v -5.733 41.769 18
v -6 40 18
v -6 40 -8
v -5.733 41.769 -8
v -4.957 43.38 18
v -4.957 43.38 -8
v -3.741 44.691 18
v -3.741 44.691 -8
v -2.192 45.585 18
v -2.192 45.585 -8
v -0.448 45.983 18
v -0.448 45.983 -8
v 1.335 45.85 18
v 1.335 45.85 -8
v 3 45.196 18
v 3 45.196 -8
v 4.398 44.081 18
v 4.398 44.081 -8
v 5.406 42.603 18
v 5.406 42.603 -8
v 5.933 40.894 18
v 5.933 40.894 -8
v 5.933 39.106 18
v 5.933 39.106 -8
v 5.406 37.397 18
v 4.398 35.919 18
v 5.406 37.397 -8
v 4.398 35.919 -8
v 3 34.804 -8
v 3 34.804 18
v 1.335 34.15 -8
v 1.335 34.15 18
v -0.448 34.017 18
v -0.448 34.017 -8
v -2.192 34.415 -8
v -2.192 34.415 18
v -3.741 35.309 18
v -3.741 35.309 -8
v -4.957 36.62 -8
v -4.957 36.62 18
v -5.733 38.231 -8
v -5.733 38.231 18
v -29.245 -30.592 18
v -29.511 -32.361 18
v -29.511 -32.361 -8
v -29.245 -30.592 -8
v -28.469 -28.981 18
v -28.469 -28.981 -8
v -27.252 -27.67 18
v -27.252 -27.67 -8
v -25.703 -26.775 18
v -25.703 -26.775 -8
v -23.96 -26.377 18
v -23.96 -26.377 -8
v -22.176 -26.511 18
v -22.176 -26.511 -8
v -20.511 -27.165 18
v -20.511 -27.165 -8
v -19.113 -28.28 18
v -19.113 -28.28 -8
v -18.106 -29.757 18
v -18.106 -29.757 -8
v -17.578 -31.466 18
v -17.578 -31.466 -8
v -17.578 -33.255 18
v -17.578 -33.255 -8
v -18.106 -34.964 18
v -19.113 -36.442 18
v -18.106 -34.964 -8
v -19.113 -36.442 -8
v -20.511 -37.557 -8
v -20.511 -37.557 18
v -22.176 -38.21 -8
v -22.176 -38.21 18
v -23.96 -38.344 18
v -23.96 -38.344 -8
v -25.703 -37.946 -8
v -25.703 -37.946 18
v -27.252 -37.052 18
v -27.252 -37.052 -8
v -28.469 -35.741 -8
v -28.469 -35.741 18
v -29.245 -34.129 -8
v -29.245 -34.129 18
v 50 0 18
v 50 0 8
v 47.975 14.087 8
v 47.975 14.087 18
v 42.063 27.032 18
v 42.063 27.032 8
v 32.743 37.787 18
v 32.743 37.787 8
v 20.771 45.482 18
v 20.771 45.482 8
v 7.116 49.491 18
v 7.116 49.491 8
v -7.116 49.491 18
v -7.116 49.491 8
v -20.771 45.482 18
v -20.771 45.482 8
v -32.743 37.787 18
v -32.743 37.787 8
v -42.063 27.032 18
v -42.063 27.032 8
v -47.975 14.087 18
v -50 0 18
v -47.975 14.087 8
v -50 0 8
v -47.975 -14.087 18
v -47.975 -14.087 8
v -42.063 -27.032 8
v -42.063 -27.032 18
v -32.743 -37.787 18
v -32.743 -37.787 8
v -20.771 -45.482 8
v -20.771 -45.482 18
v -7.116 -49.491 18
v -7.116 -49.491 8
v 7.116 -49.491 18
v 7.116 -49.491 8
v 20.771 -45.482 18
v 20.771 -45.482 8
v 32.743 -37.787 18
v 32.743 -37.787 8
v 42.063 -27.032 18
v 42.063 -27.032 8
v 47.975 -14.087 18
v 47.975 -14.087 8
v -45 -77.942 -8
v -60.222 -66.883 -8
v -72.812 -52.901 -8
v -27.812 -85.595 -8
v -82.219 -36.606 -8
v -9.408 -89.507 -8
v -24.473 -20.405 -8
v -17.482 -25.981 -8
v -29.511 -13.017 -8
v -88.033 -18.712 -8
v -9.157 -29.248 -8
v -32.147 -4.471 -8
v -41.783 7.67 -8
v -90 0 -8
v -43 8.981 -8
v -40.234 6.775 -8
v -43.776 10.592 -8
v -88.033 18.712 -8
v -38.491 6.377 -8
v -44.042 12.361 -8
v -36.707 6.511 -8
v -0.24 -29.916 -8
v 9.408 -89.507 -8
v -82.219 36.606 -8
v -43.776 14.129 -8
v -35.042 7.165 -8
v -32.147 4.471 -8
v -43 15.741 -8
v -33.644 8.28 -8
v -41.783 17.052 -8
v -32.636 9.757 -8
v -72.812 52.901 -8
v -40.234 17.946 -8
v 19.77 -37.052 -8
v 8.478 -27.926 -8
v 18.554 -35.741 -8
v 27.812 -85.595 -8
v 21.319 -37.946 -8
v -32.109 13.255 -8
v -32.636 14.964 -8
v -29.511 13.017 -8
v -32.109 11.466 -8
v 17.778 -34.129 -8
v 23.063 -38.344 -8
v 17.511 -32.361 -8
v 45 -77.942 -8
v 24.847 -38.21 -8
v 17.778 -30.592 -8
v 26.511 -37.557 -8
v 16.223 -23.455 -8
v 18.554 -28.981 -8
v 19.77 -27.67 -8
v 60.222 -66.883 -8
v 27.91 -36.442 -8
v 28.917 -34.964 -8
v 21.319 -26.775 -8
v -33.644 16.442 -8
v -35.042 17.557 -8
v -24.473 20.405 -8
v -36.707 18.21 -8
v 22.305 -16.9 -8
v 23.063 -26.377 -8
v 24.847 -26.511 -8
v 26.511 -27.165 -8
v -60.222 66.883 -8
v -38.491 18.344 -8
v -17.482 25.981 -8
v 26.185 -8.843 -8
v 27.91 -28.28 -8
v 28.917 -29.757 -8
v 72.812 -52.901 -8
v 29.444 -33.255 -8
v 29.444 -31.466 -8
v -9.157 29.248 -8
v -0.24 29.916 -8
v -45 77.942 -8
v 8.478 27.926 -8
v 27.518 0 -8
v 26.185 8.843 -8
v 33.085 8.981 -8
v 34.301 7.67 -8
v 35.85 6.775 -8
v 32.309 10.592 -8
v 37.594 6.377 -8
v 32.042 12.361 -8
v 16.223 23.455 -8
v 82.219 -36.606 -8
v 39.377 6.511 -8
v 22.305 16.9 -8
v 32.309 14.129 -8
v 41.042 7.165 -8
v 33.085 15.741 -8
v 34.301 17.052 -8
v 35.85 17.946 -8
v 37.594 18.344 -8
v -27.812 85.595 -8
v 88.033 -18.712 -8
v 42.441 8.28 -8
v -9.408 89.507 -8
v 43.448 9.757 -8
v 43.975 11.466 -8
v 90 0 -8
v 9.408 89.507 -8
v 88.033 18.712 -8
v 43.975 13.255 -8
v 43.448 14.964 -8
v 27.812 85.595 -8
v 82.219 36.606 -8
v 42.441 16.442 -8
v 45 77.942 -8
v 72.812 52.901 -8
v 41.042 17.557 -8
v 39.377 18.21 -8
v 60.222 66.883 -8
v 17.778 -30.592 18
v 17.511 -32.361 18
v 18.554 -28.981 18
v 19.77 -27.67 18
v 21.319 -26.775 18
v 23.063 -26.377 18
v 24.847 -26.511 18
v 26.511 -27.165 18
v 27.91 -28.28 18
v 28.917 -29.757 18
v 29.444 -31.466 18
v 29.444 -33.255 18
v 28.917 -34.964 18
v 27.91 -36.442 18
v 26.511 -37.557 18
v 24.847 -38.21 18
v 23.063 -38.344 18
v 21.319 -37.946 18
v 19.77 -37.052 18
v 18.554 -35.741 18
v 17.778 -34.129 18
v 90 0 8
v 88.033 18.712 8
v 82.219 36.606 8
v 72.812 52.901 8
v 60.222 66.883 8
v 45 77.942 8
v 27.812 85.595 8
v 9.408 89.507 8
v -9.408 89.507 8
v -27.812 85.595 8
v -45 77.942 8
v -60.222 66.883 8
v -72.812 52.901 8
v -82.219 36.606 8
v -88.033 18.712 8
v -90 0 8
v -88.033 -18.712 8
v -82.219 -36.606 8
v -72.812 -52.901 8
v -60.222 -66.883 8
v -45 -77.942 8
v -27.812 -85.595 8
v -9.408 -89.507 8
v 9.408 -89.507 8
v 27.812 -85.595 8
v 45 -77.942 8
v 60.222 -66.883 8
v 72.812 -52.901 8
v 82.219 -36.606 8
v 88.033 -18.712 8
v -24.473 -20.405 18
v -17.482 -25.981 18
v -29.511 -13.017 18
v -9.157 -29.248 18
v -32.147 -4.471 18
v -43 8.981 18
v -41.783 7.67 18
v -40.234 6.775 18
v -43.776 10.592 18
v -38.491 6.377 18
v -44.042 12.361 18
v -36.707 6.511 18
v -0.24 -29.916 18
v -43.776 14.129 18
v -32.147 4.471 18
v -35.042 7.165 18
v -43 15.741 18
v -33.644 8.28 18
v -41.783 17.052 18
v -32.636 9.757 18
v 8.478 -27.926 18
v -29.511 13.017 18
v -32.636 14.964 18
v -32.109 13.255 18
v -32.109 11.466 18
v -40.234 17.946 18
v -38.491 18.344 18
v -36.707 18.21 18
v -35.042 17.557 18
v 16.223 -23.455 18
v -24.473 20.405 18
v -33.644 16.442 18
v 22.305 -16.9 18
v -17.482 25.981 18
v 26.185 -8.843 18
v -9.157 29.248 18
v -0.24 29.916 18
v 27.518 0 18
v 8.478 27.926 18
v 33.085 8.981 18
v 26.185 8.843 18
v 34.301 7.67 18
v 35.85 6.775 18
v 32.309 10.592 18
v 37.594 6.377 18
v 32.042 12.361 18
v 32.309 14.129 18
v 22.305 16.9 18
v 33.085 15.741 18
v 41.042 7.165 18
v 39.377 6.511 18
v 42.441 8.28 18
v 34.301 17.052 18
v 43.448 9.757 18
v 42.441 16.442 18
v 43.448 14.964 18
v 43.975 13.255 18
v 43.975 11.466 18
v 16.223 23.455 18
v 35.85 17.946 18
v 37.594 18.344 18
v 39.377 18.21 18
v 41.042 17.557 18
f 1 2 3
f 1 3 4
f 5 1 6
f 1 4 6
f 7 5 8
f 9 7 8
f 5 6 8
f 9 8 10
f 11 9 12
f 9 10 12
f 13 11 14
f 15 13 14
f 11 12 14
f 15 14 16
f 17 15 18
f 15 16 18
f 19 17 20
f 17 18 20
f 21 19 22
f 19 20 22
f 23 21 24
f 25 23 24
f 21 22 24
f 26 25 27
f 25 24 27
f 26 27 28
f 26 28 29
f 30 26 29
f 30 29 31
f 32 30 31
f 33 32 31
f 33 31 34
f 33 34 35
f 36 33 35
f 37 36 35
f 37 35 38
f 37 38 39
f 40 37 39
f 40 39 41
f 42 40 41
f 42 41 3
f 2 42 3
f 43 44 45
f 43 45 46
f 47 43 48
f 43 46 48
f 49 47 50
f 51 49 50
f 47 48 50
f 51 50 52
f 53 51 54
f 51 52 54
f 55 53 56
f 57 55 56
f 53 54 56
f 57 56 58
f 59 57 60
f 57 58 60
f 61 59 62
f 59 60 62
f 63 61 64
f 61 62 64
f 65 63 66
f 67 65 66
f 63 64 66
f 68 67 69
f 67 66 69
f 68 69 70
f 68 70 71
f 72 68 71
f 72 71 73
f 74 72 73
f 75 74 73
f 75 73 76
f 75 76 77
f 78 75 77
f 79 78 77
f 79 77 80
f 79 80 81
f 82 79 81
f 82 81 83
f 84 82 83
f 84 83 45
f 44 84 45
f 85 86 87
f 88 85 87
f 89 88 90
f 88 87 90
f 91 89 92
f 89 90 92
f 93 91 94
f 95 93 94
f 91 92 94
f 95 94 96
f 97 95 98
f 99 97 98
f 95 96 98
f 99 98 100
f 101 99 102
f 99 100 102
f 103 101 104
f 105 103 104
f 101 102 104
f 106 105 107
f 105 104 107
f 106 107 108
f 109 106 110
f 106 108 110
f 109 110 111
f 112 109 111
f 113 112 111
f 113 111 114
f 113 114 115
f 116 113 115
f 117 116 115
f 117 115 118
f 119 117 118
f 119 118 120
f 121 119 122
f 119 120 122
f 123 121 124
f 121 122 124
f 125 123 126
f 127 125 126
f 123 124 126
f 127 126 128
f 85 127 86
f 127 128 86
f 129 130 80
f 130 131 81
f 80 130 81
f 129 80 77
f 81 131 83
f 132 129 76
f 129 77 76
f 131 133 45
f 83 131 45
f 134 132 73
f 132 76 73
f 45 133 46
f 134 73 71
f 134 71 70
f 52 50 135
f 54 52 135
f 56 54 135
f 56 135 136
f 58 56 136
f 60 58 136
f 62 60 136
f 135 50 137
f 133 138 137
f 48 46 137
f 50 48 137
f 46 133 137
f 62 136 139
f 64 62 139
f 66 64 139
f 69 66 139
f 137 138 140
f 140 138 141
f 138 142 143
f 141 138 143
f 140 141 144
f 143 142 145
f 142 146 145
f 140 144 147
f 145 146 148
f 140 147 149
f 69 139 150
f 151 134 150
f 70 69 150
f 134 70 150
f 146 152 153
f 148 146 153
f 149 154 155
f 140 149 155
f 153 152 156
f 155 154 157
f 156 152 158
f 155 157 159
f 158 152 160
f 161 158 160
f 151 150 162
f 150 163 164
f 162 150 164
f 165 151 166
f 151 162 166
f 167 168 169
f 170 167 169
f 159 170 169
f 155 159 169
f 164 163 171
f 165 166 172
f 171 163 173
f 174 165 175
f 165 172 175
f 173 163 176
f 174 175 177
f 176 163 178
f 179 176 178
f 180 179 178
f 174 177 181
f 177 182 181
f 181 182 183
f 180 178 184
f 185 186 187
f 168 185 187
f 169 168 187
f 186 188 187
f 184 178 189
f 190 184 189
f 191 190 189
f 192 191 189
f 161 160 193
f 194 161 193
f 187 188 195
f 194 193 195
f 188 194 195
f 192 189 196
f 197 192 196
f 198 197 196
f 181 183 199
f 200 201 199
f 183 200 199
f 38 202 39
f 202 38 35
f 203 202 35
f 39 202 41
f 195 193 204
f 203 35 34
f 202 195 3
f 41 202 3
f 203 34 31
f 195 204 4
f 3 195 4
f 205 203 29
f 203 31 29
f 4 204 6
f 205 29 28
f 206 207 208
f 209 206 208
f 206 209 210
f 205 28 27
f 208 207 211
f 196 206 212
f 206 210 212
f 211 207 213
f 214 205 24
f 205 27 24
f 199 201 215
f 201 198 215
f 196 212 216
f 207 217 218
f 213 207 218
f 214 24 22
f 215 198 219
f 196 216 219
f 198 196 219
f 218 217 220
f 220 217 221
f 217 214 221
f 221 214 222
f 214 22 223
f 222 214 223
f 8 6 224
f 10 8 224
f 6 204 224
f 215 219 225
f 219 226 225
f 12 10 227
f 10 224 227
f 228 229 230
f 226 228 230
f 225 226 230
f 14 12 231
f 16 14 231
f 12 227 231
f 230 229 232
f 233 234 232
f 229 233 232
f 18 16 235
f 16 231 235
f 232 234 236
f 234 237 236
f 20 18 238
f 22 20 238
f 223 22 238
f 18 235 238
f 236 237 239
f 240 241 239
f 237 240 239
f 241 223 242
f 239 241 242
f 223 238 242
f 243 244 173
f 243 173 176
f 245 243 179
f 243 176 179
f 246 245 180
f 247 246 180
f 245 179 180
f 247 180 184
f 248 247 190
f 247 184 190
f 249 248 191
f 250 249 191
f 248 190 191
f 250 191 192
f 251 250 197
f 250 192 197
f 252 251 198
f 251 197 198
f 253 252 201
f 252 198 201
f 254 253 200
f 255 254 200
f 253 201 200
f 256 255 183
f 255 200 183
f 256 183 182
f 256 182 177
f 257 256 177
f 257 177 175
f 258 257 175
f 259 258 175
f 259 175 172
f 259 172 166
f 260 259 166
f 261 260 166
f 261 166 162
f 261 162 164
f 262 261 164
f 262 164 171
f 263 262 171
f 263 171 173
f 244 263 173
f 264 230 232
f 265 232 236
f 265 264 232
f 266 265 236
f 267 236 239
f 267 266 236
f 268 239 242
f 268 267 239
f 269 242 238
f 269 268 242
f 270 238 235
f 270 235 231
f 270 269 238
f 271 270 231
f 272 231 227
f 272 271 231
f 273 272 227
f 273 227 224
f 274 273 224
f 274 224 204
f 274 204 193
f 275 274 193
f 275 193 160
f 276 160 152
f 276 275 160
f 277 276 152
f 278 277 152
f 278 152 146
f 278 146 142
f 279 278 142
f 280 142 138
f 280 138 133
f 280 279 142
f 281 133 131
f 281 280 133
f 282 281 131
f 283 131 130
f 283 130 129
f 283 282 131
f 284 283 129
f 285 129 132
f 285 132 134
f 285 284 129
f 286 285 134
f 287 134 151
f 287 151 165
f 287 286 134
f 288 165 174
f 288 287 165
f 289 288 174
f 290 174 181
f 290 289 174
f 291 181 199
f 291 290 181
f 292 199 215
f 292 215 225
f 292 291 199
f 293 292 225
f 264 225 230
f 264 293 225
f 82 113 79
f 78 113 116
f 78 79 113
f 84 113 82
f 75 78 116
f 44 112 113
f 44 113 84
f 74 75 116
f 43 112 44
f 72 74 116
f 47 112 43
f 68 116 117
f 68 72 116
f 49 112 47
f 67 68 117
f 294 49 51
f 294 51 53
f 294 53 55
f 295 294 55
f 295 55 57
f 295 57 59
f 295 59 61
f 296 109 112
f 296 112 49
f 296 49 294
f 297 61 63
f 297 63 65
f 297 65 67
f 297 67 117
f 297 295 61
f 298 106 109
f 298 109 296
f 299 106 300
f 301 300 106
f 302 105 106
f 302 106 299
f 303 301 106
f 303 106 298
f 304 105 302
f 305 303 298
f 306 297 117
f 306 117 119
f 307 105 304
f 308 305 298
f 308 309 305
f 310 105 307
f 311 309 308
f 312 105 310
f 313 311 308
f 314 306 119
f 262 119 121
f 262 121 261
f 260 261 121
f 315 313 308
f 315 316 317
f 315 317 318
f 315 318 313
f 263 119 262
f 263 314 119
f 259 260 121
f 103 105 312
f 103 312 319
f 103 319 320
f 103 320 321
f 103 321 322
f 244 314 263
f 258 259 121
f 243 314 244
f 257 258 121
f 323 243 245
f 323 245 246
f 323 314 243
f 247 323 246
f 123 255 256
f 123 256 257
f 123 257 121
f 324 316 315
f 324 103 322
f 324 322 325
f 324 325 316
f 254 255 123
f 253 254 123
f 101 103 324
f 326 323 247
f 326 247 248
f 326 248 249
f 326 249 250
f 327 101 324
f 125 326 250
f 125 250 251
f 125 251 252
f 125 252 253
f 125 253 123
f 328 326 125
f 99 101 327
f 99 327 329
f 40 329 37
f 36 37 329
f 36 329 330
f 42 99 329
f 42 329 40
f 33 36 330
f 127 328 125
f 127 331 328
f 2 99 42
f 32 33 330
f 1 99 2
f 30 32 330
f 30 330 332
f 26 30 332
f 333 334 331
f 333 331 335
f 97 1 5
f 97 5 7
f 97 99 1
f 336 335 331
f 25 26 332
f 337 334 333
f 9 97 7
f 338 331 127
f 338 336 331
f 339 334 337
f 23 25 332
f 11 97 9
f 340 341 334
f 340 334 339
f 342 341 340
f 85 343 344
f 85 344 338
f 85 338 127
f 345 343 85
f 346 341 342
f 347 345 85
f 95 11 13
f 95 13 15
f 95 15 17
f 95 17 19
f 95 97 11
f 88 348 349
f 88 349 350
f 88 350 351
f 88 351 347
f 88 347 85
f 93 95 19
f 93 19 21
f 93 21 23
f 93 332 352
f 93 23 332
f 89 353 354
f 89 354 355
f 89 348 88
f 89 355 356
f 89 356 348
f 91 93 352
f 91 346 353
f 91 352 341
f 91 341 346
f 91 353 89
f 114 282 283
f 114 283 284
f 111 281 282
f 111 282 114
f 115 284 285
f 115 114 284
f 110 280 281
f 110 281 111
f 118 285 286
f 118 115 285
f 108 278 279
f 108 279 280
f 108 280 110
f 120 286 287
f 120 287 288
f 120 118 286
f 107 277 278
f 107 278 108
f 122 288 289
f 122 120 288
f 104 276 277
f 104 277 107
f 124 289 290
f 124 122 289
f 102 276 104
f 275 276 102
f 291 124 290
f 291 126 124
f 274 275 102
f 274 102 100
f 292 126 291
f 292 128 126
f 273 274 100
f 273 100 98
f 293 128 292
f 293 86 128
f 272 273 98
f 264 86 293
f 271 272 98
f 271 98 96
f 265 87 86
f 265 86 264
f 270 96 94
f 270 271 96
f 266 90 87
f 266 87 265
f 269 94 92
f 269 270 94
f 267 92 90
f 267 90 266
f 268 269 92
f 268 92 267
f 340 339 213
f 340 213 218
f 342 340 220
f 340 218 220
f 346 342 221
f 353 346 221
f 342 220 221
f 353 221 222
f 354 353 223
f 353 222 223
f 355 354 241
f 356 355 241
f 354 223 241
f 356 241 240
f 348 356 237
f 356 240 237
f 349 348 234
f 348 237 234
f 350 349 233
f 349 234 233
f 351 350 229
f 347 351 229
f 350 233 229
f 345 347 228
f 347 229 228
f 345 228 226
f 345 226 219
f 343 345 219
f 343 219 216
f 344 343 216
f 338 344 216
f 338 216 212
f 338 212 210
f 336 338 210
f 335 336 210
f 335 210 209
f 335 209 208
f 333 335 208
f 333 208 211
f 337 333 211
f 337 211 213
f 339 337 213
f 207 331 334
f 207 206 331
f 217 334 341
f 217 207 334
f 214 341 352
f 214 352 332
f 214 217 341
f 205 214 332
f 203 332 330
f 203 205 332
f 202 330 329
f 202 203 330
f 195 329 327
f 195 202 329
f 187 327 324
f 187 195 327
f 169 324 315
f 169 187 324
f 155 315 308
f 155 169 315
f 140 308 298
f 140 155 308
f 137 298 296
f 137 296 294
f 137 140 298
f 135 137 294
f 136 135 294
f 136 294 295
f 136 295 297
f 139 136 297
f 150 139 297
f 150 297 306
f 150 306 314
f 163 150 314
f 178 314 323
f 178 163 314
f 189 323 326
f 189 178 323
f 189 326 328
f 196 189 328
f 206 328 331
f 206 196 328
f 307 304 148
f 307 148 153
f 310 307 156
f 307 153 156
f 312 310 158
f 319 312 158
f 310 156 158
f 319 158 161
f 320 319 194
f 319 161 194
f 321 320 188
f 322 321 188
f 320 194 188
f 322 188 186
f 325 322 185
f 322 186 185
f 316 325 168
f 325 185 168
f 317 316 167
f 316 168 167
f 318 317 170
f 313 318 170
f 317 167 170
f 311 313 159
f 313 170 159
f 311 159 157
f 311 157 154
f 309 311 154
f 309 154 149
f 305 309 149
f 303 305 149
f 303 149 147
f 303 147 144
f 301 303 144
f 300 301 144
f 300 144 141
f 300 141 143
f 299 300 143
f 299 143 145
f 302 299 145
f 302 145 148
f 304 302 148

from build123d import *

# Parameters (mm, degrees)
SKETCH1_R                  = 90
SKETCH1_R_2                = 30
BOSS_EXTRUDE1_DEPTH        = 8
SKETCH2_R                  = 50
SKETCH2_R_2                = 30
BOSS_EXTRUDE2_DEPTH        = 10
F_12_0_12_DIAMETER_HOLE1_D = 12


with BuildPart() as part:
    # Sketch1 → Boss-Extrude1 (new, symmetric)
    with BuildSketch(Plane.XY):
        Circle(SKETCH1_R)
        with Locations((-2.481799725, 0)):
            Circle(SKETCH1_R_2, mode=Mode.SUBTRACT)
    extrude(amount=BOSS_EXTRUDE1_DEPTH, both=True)

    # Sketch2 → Boss-Extrude2 (add)
    with BuildSketch(Plane.XY.offset(8)):
        Circle(SKETCH2_R)
        with Locations((-2.481799725, 0)):
            Circle(SKETCH2_R_2, mode=Mode.SUBTRACT)
    extrude(amount=BOSS_EXTRUDE2_DEPTH)

    # Ø12.0 (12) Diameter Hole1 (through all)
    with Locations(Plane(origin=(0, 40, 18), x_dir=(1, 0, 0), z_dir=(0, 0, 1))):
        with Locations((0, 0), (-38.042260652, -27.639320225), (-23.511410092, -72.360679775), (23.511410092, -72.360679775), (38.042260652, -27.639320225)):
            Hole(F_12_0_12_DIAMETER_HOLE1_D / 2)


solid = part.part
